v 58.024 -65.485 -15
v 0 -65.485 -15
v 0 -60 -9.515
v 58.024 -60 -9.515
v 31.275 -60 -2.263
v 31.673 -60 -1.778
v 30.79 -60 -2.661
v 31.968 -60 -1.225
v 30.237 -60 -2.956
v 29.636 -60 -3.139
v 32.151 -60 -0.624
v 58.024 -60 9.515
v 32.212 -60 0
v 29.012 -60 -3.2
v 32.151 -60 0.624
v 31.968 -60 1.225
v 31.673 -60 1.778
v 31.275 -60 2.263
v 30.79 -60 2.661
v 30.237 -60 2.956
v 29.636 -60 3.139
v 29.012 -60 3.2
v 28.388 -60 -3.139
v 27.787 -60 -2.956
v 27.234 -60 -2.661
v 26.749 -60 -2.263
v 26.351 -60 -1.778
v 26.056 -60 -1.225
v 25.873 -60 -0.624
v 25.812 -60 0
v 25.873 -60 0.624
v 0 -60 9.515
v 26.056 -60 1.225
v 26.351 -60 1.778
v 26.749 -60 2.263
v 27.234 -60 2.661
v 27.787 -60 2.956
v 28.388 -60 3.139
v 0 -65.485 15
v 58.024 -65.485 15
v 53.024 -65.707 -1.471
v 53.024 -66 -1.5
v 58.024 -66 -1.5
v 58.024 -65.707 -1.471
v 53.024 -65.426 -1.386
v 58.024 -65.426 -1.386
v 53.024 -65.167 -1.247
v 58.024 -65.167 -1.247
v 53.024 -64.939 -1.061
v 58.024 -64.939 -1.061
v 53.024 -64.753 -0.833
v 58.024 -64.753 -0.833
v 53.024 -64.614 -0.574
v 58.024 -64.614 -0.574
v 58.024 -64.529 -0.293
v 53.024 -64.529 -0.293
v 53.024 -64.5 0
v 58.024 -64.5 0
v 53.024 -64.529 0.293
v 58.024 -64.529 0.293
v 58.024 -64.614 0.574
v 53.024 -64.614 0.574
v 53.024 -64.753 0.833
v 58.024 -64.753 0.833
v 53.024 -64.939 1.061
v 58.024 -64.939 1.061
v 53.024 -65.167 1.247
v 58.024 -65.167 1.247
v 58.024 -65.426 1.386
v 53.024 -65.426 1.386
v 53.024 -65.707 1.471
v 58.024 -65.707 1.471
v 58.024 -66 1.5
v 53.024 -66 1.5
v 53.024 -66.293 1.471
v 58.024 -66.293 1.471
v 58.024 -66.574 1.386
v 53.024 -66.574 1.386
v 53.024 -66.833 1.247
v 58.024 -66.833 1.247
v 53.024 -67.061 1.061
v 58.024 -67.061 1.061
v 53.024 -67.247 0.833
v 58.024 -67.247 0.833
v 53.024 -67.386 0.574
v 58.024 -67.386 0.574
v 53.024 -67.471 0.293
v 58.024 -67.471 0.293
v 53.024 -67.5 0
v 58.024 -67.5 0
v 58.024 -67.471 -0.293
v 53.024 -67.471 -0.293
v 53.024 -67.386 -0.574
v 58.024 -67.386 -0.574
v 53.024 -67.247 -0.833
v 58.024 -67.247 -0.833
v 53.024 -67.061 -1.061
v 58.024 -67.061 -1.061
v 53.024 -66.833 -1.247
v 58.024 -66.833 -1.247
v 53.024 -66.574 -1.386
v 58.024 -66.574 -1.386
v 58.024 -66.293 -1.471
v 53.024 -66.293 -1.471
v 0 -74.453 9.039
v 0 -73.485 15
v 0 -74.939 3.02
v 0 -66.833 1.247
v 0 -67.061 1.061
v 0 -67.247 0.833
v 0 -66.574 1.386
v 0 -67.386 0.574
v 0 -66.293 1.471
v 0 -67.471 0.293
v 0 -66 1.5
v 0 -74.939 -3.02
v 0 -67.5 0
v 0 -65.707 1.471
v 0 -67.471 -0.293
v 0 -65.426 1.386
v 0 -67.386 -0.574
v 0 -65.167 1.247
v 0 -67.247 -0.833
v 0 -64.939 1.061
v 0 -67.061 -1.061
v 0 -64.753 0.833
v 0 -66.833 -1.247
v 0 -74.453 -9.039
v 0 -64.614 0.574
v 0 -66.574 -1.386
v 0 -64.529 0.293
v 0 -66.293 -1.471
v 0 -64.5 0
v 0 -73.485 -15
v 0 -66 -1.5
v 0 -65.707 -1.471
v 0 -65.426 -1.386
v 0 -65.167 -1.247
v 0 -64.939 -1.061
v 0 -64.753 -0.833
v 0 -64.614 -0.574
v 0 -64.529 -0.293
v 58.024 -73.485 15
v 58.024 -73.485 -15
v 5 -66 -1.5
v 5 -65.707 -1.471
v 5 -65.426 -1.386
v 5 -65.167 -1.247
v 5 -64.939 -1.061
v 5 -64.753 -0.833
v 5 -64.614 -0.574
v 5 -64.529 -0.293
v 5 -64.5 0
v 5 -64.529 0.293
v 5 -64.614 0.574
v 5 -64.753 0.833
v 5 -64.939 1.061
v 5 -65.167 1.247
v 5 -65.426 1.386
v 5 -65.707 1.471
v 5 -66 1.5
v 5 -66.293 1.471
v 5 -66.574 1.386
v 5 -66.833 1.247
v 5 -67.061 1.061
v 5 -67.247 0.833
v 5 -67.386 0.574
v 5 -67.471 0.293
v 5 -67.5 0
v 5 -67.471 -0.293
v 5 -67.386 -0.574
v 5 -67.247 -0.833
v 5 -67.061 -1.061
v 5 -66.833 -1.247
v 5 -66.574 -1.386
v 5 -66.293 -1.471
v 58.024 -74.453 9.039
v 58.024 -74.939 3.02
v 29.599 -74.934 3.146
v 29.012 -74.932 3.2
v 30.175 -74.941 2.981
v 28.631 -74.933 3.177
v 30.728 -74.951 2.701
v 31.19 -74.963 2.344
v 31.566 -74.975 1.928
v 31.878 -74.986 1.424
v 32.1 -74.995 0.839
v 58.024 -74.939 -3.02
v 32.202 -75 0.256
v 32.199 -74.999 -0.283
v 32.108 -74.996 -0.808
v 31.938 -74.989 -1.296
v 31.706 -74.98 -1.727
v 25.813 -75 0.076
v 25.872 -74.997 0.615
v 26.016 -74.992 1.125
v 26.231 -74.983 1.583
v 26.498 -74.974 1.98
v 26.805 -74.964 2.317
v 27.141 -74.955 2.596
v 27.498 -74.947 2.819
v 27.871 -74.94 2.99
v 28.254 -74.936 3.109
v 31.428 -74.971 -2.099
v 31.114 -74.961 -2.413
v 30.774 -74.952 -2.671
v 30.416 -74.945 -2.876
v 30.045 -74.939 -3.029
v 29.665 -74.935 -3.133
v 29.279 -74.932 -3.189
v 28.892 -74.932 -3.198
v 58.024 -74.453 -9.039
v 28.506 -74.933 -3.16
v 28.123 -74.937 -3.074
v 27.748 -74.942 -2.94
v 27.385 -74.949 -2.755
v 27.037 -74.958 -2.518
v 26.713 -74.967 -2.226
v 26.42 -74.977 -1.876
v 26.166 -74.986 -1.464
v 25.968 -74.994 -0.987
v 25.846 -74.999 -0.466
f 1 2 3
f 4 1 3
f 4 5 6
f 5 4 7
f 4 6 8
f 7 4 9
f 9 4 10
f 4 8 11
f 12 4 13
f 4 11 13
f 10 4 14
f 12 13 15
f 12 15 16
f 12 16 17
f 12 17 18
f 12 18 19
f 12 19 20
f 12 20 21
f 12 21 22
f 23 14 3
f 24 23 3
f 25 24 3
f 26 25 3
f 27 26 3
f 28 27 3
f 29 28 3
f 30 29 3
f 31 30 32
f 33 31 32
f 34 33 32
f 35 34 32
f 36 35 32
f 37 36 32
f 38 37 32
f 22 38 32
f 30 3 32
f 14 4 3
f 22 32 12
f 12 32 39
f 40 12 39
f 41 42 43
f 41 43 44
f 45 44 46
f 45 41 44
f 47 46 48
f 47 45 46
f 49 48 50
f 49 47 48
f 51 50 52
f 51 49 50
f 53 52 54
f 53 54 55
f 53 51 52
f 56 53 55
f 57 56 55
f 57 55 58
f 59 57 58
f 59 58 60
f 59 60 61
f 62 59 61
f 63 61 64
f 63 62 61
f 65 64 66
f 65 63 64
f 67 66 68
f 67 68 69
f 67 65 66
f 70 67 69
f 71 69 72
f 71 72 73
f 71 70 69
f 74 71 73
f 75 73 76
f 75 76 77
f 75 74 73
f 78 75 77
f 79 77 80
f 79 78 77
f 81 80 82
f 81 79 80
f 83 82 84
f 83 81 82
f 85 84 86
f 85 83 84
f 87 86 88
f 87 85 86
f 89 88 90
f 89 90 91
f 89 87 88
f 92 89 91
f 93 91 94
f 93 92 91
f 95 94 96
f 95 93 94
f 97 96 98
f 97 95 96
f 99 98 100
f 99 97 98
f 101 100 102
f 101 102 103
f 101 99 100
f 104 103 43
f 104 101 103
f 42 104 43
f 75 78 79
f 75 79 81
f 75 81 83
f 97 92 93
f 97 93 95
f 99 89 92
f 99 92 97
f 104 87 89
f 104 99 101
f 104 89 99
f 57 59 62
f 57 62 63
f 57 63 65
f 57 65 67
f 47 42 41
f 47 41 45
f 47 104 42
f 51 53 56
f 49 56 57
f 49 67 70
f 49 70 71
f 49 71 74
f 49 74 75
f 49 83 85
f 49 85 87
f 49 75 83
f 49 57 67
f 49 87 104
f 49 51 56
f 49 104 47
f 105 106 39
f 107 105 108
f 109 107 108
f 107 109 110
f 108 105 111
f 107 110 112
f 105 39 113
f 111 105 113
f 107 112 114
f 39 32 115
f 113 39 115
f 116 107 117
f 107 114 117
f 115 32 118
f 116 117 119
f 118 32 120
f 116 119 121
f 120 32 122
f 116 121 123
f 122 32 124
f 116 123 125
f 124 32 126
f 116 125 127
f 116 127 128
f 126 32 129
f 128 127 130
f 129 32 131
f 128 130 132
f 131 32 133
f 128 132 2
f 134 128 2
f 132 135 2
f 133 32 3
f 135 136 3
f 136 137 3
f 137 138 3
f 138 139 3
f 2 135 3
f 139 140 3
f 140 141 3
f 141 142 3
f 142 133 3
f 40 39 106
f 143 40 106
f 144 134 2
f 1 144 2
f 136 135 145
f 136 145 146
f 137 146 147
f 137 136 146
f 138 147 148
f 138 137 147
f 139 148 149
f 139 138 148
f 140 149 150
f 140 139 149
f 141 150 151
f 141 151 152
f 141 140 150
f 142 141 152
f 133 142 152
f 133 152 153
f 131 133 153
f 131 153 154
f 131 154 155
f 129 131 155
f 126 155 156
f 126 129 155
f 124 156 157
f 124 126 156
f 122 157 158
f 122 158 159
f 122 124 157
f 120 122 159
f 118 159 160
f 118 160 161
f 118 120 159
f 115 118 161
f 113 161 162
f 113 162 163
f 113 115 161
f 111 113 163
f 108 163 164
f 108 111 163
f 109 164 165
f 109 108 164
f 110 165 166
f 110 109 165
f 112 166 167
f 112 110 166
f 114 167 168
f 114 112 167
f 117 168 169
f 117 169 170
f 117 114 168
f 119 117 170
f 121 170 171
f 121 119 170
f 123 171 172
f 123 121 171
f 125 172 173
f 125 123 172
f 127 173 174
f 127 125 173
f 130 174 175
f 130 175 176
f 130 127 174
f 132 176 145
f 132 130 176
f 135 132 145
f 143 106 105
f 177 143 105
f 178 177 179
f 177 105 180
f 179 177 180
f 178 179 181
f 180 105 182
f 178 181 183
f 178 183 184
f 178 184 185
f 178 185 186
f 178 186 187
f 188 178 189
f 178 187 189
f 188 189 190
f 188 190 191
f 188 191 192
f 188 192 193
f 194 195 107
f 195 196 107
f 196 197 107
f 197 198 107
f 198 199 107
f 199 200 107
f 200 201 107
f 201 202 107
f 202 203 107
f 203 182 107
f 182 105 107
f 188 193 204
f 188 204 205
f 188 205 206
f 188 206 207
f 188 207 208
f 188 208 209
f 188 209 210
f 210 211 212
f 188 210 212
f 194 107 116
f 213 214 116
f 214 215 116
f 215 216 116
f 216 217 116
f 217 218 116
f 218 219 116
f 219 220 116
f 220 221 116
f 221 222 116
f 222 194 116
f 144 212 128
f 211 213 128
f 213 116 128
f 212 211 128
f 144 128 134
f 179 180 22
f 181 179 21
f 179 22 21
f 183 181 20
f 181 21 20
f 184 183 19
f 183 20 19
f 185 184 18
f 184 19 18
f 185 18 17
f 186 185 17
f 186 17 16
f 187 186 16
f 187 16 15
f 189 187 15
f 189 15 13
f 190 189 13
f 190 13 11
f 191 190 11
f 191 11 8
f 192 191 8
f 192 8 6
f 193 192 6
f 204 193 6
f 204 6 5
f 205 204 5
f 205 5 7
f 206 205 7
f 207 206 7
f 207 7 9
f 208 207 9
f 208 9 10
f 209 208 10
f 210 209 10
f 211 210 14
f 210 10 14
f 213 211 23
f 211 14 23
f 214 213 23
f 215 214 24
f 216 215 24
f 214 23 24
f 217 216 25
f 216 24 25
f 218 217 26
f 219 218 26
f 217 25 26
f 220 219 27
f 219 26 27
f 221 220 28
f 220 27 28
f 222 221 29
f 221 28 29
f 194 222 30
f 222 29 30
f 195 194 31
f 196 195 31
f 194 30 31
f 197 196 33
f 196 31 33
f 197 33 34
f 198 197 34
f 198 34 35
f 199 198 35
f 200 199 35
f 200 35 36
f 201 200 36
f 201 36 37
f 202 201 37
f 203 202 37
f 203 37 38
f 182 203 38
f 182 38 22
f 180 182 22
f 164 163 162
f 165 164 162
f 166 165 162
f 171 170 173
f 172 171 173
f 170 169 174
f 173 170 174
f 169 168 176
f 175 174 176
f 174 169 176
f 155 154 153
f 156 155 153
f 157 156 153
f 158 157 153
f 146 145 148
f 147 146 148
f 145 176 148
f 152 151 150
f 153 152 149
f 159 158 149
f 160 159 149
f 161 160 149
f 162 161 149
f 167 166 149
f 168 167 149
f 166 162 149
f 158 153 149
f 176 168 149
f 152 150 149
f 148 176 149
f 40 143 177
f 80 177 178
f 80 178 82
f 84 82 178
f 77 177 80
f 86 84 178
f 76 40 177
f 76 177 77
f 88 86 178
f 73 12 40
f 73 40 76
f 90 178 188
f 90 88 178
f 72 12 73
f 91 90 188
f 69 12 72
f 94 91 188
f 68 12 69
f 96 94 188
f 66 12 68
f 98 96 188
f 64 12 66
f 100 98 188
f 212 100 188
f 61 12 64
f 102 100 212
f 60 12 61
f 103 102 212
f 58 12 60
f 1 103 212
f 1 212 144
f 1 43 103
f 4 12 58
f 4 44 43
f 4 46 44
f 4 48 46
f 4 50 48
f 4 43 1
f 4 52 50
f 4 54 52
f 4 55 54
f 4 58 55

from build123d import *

# Parameters (mm, degrees)
BOSS_EXTRUDE1_DEPTH = 58.024
SKETCH2_R           = 3.2
CUT_EXTRUDE1_DEPTH  = 62.780130916
SKETCH4_R           = 1.5
CUT_EXTRUDE2_DEPTH  = 5
CUT_EXTRUDE4_START  = -5
SKETCH5_R           = 1.5
CUT_EXTRUDE4_DEPTH  = 5


with BuildPart() as part:
    # Sketch1 → Boss-Extrude1 (new body)
    with BuildSketch(Plane(origin=(0, 0, 0), x_dir=(0, 0, -1), z_dir=(1, 0, 0))):
        with BuildLine():
            Line((15, -73.484692283), (15, -65.484692283))
            Line((15, -65.484692283), (9.515307717, -60))
            Line((9.515307717, -60), (0, -60))
            Line((0, -60), (-9.515307717, -60))
            Line((-9.515307717, -60), (-15, -65.484692283))
            Line((-15, -65.484692283), (-15, -73.484692283))
            ThreePointArc((-15, -73.484692283), (0, -75), (15, -73.484692283))
        make_face()
    extrude(amount=BOSS_EXTRUDE1_DEPTH)

    # Sketch2 → Cut-Extrude1 (cut, through all)
    with BuildSketch(Plane(origin=(0, -60, 0), x_dir=(1, 0, 0), z_dir=(0, 1, 0))):
        with Locations(Location((29.012, 0, 0), (0, 0, 270))):
            Circle(SKETCH2_R)
    extrude(amount=-CUT_EXTRUDE1_DEPTH, mode=Mode.SUBTRACT)

    # Sketch4 → Cut-Extrude2 (cut)
    with BuildSketch(Plane(origin=(0, 0, 0), x_dir=(0, 0, -1), z_dir=(1, 0, 0))):
        with Locations((0, -66)):
            Circle(SKETCH4_R)
    extrude(amount=CUT_EXTRUDE2_DEPTH, mode=Mode.SUBTRACT)

    # Sketch5 → Cut-Extrude4 (cut)
    with BuildSketch(Plane(origin=(58.024, 0, 0), x_dir=(0, 0, -1), z_dir=(1, 0, 0)).offset(CUT_EXTRUDE4_START)):
        with Locations((0, -66)):
            Circle(SKETCH5_R)
    extrude(amount=CUT_EXTRUDE4_DEPTH, mode=Mode.SUBTRACT)


solid = part.part
